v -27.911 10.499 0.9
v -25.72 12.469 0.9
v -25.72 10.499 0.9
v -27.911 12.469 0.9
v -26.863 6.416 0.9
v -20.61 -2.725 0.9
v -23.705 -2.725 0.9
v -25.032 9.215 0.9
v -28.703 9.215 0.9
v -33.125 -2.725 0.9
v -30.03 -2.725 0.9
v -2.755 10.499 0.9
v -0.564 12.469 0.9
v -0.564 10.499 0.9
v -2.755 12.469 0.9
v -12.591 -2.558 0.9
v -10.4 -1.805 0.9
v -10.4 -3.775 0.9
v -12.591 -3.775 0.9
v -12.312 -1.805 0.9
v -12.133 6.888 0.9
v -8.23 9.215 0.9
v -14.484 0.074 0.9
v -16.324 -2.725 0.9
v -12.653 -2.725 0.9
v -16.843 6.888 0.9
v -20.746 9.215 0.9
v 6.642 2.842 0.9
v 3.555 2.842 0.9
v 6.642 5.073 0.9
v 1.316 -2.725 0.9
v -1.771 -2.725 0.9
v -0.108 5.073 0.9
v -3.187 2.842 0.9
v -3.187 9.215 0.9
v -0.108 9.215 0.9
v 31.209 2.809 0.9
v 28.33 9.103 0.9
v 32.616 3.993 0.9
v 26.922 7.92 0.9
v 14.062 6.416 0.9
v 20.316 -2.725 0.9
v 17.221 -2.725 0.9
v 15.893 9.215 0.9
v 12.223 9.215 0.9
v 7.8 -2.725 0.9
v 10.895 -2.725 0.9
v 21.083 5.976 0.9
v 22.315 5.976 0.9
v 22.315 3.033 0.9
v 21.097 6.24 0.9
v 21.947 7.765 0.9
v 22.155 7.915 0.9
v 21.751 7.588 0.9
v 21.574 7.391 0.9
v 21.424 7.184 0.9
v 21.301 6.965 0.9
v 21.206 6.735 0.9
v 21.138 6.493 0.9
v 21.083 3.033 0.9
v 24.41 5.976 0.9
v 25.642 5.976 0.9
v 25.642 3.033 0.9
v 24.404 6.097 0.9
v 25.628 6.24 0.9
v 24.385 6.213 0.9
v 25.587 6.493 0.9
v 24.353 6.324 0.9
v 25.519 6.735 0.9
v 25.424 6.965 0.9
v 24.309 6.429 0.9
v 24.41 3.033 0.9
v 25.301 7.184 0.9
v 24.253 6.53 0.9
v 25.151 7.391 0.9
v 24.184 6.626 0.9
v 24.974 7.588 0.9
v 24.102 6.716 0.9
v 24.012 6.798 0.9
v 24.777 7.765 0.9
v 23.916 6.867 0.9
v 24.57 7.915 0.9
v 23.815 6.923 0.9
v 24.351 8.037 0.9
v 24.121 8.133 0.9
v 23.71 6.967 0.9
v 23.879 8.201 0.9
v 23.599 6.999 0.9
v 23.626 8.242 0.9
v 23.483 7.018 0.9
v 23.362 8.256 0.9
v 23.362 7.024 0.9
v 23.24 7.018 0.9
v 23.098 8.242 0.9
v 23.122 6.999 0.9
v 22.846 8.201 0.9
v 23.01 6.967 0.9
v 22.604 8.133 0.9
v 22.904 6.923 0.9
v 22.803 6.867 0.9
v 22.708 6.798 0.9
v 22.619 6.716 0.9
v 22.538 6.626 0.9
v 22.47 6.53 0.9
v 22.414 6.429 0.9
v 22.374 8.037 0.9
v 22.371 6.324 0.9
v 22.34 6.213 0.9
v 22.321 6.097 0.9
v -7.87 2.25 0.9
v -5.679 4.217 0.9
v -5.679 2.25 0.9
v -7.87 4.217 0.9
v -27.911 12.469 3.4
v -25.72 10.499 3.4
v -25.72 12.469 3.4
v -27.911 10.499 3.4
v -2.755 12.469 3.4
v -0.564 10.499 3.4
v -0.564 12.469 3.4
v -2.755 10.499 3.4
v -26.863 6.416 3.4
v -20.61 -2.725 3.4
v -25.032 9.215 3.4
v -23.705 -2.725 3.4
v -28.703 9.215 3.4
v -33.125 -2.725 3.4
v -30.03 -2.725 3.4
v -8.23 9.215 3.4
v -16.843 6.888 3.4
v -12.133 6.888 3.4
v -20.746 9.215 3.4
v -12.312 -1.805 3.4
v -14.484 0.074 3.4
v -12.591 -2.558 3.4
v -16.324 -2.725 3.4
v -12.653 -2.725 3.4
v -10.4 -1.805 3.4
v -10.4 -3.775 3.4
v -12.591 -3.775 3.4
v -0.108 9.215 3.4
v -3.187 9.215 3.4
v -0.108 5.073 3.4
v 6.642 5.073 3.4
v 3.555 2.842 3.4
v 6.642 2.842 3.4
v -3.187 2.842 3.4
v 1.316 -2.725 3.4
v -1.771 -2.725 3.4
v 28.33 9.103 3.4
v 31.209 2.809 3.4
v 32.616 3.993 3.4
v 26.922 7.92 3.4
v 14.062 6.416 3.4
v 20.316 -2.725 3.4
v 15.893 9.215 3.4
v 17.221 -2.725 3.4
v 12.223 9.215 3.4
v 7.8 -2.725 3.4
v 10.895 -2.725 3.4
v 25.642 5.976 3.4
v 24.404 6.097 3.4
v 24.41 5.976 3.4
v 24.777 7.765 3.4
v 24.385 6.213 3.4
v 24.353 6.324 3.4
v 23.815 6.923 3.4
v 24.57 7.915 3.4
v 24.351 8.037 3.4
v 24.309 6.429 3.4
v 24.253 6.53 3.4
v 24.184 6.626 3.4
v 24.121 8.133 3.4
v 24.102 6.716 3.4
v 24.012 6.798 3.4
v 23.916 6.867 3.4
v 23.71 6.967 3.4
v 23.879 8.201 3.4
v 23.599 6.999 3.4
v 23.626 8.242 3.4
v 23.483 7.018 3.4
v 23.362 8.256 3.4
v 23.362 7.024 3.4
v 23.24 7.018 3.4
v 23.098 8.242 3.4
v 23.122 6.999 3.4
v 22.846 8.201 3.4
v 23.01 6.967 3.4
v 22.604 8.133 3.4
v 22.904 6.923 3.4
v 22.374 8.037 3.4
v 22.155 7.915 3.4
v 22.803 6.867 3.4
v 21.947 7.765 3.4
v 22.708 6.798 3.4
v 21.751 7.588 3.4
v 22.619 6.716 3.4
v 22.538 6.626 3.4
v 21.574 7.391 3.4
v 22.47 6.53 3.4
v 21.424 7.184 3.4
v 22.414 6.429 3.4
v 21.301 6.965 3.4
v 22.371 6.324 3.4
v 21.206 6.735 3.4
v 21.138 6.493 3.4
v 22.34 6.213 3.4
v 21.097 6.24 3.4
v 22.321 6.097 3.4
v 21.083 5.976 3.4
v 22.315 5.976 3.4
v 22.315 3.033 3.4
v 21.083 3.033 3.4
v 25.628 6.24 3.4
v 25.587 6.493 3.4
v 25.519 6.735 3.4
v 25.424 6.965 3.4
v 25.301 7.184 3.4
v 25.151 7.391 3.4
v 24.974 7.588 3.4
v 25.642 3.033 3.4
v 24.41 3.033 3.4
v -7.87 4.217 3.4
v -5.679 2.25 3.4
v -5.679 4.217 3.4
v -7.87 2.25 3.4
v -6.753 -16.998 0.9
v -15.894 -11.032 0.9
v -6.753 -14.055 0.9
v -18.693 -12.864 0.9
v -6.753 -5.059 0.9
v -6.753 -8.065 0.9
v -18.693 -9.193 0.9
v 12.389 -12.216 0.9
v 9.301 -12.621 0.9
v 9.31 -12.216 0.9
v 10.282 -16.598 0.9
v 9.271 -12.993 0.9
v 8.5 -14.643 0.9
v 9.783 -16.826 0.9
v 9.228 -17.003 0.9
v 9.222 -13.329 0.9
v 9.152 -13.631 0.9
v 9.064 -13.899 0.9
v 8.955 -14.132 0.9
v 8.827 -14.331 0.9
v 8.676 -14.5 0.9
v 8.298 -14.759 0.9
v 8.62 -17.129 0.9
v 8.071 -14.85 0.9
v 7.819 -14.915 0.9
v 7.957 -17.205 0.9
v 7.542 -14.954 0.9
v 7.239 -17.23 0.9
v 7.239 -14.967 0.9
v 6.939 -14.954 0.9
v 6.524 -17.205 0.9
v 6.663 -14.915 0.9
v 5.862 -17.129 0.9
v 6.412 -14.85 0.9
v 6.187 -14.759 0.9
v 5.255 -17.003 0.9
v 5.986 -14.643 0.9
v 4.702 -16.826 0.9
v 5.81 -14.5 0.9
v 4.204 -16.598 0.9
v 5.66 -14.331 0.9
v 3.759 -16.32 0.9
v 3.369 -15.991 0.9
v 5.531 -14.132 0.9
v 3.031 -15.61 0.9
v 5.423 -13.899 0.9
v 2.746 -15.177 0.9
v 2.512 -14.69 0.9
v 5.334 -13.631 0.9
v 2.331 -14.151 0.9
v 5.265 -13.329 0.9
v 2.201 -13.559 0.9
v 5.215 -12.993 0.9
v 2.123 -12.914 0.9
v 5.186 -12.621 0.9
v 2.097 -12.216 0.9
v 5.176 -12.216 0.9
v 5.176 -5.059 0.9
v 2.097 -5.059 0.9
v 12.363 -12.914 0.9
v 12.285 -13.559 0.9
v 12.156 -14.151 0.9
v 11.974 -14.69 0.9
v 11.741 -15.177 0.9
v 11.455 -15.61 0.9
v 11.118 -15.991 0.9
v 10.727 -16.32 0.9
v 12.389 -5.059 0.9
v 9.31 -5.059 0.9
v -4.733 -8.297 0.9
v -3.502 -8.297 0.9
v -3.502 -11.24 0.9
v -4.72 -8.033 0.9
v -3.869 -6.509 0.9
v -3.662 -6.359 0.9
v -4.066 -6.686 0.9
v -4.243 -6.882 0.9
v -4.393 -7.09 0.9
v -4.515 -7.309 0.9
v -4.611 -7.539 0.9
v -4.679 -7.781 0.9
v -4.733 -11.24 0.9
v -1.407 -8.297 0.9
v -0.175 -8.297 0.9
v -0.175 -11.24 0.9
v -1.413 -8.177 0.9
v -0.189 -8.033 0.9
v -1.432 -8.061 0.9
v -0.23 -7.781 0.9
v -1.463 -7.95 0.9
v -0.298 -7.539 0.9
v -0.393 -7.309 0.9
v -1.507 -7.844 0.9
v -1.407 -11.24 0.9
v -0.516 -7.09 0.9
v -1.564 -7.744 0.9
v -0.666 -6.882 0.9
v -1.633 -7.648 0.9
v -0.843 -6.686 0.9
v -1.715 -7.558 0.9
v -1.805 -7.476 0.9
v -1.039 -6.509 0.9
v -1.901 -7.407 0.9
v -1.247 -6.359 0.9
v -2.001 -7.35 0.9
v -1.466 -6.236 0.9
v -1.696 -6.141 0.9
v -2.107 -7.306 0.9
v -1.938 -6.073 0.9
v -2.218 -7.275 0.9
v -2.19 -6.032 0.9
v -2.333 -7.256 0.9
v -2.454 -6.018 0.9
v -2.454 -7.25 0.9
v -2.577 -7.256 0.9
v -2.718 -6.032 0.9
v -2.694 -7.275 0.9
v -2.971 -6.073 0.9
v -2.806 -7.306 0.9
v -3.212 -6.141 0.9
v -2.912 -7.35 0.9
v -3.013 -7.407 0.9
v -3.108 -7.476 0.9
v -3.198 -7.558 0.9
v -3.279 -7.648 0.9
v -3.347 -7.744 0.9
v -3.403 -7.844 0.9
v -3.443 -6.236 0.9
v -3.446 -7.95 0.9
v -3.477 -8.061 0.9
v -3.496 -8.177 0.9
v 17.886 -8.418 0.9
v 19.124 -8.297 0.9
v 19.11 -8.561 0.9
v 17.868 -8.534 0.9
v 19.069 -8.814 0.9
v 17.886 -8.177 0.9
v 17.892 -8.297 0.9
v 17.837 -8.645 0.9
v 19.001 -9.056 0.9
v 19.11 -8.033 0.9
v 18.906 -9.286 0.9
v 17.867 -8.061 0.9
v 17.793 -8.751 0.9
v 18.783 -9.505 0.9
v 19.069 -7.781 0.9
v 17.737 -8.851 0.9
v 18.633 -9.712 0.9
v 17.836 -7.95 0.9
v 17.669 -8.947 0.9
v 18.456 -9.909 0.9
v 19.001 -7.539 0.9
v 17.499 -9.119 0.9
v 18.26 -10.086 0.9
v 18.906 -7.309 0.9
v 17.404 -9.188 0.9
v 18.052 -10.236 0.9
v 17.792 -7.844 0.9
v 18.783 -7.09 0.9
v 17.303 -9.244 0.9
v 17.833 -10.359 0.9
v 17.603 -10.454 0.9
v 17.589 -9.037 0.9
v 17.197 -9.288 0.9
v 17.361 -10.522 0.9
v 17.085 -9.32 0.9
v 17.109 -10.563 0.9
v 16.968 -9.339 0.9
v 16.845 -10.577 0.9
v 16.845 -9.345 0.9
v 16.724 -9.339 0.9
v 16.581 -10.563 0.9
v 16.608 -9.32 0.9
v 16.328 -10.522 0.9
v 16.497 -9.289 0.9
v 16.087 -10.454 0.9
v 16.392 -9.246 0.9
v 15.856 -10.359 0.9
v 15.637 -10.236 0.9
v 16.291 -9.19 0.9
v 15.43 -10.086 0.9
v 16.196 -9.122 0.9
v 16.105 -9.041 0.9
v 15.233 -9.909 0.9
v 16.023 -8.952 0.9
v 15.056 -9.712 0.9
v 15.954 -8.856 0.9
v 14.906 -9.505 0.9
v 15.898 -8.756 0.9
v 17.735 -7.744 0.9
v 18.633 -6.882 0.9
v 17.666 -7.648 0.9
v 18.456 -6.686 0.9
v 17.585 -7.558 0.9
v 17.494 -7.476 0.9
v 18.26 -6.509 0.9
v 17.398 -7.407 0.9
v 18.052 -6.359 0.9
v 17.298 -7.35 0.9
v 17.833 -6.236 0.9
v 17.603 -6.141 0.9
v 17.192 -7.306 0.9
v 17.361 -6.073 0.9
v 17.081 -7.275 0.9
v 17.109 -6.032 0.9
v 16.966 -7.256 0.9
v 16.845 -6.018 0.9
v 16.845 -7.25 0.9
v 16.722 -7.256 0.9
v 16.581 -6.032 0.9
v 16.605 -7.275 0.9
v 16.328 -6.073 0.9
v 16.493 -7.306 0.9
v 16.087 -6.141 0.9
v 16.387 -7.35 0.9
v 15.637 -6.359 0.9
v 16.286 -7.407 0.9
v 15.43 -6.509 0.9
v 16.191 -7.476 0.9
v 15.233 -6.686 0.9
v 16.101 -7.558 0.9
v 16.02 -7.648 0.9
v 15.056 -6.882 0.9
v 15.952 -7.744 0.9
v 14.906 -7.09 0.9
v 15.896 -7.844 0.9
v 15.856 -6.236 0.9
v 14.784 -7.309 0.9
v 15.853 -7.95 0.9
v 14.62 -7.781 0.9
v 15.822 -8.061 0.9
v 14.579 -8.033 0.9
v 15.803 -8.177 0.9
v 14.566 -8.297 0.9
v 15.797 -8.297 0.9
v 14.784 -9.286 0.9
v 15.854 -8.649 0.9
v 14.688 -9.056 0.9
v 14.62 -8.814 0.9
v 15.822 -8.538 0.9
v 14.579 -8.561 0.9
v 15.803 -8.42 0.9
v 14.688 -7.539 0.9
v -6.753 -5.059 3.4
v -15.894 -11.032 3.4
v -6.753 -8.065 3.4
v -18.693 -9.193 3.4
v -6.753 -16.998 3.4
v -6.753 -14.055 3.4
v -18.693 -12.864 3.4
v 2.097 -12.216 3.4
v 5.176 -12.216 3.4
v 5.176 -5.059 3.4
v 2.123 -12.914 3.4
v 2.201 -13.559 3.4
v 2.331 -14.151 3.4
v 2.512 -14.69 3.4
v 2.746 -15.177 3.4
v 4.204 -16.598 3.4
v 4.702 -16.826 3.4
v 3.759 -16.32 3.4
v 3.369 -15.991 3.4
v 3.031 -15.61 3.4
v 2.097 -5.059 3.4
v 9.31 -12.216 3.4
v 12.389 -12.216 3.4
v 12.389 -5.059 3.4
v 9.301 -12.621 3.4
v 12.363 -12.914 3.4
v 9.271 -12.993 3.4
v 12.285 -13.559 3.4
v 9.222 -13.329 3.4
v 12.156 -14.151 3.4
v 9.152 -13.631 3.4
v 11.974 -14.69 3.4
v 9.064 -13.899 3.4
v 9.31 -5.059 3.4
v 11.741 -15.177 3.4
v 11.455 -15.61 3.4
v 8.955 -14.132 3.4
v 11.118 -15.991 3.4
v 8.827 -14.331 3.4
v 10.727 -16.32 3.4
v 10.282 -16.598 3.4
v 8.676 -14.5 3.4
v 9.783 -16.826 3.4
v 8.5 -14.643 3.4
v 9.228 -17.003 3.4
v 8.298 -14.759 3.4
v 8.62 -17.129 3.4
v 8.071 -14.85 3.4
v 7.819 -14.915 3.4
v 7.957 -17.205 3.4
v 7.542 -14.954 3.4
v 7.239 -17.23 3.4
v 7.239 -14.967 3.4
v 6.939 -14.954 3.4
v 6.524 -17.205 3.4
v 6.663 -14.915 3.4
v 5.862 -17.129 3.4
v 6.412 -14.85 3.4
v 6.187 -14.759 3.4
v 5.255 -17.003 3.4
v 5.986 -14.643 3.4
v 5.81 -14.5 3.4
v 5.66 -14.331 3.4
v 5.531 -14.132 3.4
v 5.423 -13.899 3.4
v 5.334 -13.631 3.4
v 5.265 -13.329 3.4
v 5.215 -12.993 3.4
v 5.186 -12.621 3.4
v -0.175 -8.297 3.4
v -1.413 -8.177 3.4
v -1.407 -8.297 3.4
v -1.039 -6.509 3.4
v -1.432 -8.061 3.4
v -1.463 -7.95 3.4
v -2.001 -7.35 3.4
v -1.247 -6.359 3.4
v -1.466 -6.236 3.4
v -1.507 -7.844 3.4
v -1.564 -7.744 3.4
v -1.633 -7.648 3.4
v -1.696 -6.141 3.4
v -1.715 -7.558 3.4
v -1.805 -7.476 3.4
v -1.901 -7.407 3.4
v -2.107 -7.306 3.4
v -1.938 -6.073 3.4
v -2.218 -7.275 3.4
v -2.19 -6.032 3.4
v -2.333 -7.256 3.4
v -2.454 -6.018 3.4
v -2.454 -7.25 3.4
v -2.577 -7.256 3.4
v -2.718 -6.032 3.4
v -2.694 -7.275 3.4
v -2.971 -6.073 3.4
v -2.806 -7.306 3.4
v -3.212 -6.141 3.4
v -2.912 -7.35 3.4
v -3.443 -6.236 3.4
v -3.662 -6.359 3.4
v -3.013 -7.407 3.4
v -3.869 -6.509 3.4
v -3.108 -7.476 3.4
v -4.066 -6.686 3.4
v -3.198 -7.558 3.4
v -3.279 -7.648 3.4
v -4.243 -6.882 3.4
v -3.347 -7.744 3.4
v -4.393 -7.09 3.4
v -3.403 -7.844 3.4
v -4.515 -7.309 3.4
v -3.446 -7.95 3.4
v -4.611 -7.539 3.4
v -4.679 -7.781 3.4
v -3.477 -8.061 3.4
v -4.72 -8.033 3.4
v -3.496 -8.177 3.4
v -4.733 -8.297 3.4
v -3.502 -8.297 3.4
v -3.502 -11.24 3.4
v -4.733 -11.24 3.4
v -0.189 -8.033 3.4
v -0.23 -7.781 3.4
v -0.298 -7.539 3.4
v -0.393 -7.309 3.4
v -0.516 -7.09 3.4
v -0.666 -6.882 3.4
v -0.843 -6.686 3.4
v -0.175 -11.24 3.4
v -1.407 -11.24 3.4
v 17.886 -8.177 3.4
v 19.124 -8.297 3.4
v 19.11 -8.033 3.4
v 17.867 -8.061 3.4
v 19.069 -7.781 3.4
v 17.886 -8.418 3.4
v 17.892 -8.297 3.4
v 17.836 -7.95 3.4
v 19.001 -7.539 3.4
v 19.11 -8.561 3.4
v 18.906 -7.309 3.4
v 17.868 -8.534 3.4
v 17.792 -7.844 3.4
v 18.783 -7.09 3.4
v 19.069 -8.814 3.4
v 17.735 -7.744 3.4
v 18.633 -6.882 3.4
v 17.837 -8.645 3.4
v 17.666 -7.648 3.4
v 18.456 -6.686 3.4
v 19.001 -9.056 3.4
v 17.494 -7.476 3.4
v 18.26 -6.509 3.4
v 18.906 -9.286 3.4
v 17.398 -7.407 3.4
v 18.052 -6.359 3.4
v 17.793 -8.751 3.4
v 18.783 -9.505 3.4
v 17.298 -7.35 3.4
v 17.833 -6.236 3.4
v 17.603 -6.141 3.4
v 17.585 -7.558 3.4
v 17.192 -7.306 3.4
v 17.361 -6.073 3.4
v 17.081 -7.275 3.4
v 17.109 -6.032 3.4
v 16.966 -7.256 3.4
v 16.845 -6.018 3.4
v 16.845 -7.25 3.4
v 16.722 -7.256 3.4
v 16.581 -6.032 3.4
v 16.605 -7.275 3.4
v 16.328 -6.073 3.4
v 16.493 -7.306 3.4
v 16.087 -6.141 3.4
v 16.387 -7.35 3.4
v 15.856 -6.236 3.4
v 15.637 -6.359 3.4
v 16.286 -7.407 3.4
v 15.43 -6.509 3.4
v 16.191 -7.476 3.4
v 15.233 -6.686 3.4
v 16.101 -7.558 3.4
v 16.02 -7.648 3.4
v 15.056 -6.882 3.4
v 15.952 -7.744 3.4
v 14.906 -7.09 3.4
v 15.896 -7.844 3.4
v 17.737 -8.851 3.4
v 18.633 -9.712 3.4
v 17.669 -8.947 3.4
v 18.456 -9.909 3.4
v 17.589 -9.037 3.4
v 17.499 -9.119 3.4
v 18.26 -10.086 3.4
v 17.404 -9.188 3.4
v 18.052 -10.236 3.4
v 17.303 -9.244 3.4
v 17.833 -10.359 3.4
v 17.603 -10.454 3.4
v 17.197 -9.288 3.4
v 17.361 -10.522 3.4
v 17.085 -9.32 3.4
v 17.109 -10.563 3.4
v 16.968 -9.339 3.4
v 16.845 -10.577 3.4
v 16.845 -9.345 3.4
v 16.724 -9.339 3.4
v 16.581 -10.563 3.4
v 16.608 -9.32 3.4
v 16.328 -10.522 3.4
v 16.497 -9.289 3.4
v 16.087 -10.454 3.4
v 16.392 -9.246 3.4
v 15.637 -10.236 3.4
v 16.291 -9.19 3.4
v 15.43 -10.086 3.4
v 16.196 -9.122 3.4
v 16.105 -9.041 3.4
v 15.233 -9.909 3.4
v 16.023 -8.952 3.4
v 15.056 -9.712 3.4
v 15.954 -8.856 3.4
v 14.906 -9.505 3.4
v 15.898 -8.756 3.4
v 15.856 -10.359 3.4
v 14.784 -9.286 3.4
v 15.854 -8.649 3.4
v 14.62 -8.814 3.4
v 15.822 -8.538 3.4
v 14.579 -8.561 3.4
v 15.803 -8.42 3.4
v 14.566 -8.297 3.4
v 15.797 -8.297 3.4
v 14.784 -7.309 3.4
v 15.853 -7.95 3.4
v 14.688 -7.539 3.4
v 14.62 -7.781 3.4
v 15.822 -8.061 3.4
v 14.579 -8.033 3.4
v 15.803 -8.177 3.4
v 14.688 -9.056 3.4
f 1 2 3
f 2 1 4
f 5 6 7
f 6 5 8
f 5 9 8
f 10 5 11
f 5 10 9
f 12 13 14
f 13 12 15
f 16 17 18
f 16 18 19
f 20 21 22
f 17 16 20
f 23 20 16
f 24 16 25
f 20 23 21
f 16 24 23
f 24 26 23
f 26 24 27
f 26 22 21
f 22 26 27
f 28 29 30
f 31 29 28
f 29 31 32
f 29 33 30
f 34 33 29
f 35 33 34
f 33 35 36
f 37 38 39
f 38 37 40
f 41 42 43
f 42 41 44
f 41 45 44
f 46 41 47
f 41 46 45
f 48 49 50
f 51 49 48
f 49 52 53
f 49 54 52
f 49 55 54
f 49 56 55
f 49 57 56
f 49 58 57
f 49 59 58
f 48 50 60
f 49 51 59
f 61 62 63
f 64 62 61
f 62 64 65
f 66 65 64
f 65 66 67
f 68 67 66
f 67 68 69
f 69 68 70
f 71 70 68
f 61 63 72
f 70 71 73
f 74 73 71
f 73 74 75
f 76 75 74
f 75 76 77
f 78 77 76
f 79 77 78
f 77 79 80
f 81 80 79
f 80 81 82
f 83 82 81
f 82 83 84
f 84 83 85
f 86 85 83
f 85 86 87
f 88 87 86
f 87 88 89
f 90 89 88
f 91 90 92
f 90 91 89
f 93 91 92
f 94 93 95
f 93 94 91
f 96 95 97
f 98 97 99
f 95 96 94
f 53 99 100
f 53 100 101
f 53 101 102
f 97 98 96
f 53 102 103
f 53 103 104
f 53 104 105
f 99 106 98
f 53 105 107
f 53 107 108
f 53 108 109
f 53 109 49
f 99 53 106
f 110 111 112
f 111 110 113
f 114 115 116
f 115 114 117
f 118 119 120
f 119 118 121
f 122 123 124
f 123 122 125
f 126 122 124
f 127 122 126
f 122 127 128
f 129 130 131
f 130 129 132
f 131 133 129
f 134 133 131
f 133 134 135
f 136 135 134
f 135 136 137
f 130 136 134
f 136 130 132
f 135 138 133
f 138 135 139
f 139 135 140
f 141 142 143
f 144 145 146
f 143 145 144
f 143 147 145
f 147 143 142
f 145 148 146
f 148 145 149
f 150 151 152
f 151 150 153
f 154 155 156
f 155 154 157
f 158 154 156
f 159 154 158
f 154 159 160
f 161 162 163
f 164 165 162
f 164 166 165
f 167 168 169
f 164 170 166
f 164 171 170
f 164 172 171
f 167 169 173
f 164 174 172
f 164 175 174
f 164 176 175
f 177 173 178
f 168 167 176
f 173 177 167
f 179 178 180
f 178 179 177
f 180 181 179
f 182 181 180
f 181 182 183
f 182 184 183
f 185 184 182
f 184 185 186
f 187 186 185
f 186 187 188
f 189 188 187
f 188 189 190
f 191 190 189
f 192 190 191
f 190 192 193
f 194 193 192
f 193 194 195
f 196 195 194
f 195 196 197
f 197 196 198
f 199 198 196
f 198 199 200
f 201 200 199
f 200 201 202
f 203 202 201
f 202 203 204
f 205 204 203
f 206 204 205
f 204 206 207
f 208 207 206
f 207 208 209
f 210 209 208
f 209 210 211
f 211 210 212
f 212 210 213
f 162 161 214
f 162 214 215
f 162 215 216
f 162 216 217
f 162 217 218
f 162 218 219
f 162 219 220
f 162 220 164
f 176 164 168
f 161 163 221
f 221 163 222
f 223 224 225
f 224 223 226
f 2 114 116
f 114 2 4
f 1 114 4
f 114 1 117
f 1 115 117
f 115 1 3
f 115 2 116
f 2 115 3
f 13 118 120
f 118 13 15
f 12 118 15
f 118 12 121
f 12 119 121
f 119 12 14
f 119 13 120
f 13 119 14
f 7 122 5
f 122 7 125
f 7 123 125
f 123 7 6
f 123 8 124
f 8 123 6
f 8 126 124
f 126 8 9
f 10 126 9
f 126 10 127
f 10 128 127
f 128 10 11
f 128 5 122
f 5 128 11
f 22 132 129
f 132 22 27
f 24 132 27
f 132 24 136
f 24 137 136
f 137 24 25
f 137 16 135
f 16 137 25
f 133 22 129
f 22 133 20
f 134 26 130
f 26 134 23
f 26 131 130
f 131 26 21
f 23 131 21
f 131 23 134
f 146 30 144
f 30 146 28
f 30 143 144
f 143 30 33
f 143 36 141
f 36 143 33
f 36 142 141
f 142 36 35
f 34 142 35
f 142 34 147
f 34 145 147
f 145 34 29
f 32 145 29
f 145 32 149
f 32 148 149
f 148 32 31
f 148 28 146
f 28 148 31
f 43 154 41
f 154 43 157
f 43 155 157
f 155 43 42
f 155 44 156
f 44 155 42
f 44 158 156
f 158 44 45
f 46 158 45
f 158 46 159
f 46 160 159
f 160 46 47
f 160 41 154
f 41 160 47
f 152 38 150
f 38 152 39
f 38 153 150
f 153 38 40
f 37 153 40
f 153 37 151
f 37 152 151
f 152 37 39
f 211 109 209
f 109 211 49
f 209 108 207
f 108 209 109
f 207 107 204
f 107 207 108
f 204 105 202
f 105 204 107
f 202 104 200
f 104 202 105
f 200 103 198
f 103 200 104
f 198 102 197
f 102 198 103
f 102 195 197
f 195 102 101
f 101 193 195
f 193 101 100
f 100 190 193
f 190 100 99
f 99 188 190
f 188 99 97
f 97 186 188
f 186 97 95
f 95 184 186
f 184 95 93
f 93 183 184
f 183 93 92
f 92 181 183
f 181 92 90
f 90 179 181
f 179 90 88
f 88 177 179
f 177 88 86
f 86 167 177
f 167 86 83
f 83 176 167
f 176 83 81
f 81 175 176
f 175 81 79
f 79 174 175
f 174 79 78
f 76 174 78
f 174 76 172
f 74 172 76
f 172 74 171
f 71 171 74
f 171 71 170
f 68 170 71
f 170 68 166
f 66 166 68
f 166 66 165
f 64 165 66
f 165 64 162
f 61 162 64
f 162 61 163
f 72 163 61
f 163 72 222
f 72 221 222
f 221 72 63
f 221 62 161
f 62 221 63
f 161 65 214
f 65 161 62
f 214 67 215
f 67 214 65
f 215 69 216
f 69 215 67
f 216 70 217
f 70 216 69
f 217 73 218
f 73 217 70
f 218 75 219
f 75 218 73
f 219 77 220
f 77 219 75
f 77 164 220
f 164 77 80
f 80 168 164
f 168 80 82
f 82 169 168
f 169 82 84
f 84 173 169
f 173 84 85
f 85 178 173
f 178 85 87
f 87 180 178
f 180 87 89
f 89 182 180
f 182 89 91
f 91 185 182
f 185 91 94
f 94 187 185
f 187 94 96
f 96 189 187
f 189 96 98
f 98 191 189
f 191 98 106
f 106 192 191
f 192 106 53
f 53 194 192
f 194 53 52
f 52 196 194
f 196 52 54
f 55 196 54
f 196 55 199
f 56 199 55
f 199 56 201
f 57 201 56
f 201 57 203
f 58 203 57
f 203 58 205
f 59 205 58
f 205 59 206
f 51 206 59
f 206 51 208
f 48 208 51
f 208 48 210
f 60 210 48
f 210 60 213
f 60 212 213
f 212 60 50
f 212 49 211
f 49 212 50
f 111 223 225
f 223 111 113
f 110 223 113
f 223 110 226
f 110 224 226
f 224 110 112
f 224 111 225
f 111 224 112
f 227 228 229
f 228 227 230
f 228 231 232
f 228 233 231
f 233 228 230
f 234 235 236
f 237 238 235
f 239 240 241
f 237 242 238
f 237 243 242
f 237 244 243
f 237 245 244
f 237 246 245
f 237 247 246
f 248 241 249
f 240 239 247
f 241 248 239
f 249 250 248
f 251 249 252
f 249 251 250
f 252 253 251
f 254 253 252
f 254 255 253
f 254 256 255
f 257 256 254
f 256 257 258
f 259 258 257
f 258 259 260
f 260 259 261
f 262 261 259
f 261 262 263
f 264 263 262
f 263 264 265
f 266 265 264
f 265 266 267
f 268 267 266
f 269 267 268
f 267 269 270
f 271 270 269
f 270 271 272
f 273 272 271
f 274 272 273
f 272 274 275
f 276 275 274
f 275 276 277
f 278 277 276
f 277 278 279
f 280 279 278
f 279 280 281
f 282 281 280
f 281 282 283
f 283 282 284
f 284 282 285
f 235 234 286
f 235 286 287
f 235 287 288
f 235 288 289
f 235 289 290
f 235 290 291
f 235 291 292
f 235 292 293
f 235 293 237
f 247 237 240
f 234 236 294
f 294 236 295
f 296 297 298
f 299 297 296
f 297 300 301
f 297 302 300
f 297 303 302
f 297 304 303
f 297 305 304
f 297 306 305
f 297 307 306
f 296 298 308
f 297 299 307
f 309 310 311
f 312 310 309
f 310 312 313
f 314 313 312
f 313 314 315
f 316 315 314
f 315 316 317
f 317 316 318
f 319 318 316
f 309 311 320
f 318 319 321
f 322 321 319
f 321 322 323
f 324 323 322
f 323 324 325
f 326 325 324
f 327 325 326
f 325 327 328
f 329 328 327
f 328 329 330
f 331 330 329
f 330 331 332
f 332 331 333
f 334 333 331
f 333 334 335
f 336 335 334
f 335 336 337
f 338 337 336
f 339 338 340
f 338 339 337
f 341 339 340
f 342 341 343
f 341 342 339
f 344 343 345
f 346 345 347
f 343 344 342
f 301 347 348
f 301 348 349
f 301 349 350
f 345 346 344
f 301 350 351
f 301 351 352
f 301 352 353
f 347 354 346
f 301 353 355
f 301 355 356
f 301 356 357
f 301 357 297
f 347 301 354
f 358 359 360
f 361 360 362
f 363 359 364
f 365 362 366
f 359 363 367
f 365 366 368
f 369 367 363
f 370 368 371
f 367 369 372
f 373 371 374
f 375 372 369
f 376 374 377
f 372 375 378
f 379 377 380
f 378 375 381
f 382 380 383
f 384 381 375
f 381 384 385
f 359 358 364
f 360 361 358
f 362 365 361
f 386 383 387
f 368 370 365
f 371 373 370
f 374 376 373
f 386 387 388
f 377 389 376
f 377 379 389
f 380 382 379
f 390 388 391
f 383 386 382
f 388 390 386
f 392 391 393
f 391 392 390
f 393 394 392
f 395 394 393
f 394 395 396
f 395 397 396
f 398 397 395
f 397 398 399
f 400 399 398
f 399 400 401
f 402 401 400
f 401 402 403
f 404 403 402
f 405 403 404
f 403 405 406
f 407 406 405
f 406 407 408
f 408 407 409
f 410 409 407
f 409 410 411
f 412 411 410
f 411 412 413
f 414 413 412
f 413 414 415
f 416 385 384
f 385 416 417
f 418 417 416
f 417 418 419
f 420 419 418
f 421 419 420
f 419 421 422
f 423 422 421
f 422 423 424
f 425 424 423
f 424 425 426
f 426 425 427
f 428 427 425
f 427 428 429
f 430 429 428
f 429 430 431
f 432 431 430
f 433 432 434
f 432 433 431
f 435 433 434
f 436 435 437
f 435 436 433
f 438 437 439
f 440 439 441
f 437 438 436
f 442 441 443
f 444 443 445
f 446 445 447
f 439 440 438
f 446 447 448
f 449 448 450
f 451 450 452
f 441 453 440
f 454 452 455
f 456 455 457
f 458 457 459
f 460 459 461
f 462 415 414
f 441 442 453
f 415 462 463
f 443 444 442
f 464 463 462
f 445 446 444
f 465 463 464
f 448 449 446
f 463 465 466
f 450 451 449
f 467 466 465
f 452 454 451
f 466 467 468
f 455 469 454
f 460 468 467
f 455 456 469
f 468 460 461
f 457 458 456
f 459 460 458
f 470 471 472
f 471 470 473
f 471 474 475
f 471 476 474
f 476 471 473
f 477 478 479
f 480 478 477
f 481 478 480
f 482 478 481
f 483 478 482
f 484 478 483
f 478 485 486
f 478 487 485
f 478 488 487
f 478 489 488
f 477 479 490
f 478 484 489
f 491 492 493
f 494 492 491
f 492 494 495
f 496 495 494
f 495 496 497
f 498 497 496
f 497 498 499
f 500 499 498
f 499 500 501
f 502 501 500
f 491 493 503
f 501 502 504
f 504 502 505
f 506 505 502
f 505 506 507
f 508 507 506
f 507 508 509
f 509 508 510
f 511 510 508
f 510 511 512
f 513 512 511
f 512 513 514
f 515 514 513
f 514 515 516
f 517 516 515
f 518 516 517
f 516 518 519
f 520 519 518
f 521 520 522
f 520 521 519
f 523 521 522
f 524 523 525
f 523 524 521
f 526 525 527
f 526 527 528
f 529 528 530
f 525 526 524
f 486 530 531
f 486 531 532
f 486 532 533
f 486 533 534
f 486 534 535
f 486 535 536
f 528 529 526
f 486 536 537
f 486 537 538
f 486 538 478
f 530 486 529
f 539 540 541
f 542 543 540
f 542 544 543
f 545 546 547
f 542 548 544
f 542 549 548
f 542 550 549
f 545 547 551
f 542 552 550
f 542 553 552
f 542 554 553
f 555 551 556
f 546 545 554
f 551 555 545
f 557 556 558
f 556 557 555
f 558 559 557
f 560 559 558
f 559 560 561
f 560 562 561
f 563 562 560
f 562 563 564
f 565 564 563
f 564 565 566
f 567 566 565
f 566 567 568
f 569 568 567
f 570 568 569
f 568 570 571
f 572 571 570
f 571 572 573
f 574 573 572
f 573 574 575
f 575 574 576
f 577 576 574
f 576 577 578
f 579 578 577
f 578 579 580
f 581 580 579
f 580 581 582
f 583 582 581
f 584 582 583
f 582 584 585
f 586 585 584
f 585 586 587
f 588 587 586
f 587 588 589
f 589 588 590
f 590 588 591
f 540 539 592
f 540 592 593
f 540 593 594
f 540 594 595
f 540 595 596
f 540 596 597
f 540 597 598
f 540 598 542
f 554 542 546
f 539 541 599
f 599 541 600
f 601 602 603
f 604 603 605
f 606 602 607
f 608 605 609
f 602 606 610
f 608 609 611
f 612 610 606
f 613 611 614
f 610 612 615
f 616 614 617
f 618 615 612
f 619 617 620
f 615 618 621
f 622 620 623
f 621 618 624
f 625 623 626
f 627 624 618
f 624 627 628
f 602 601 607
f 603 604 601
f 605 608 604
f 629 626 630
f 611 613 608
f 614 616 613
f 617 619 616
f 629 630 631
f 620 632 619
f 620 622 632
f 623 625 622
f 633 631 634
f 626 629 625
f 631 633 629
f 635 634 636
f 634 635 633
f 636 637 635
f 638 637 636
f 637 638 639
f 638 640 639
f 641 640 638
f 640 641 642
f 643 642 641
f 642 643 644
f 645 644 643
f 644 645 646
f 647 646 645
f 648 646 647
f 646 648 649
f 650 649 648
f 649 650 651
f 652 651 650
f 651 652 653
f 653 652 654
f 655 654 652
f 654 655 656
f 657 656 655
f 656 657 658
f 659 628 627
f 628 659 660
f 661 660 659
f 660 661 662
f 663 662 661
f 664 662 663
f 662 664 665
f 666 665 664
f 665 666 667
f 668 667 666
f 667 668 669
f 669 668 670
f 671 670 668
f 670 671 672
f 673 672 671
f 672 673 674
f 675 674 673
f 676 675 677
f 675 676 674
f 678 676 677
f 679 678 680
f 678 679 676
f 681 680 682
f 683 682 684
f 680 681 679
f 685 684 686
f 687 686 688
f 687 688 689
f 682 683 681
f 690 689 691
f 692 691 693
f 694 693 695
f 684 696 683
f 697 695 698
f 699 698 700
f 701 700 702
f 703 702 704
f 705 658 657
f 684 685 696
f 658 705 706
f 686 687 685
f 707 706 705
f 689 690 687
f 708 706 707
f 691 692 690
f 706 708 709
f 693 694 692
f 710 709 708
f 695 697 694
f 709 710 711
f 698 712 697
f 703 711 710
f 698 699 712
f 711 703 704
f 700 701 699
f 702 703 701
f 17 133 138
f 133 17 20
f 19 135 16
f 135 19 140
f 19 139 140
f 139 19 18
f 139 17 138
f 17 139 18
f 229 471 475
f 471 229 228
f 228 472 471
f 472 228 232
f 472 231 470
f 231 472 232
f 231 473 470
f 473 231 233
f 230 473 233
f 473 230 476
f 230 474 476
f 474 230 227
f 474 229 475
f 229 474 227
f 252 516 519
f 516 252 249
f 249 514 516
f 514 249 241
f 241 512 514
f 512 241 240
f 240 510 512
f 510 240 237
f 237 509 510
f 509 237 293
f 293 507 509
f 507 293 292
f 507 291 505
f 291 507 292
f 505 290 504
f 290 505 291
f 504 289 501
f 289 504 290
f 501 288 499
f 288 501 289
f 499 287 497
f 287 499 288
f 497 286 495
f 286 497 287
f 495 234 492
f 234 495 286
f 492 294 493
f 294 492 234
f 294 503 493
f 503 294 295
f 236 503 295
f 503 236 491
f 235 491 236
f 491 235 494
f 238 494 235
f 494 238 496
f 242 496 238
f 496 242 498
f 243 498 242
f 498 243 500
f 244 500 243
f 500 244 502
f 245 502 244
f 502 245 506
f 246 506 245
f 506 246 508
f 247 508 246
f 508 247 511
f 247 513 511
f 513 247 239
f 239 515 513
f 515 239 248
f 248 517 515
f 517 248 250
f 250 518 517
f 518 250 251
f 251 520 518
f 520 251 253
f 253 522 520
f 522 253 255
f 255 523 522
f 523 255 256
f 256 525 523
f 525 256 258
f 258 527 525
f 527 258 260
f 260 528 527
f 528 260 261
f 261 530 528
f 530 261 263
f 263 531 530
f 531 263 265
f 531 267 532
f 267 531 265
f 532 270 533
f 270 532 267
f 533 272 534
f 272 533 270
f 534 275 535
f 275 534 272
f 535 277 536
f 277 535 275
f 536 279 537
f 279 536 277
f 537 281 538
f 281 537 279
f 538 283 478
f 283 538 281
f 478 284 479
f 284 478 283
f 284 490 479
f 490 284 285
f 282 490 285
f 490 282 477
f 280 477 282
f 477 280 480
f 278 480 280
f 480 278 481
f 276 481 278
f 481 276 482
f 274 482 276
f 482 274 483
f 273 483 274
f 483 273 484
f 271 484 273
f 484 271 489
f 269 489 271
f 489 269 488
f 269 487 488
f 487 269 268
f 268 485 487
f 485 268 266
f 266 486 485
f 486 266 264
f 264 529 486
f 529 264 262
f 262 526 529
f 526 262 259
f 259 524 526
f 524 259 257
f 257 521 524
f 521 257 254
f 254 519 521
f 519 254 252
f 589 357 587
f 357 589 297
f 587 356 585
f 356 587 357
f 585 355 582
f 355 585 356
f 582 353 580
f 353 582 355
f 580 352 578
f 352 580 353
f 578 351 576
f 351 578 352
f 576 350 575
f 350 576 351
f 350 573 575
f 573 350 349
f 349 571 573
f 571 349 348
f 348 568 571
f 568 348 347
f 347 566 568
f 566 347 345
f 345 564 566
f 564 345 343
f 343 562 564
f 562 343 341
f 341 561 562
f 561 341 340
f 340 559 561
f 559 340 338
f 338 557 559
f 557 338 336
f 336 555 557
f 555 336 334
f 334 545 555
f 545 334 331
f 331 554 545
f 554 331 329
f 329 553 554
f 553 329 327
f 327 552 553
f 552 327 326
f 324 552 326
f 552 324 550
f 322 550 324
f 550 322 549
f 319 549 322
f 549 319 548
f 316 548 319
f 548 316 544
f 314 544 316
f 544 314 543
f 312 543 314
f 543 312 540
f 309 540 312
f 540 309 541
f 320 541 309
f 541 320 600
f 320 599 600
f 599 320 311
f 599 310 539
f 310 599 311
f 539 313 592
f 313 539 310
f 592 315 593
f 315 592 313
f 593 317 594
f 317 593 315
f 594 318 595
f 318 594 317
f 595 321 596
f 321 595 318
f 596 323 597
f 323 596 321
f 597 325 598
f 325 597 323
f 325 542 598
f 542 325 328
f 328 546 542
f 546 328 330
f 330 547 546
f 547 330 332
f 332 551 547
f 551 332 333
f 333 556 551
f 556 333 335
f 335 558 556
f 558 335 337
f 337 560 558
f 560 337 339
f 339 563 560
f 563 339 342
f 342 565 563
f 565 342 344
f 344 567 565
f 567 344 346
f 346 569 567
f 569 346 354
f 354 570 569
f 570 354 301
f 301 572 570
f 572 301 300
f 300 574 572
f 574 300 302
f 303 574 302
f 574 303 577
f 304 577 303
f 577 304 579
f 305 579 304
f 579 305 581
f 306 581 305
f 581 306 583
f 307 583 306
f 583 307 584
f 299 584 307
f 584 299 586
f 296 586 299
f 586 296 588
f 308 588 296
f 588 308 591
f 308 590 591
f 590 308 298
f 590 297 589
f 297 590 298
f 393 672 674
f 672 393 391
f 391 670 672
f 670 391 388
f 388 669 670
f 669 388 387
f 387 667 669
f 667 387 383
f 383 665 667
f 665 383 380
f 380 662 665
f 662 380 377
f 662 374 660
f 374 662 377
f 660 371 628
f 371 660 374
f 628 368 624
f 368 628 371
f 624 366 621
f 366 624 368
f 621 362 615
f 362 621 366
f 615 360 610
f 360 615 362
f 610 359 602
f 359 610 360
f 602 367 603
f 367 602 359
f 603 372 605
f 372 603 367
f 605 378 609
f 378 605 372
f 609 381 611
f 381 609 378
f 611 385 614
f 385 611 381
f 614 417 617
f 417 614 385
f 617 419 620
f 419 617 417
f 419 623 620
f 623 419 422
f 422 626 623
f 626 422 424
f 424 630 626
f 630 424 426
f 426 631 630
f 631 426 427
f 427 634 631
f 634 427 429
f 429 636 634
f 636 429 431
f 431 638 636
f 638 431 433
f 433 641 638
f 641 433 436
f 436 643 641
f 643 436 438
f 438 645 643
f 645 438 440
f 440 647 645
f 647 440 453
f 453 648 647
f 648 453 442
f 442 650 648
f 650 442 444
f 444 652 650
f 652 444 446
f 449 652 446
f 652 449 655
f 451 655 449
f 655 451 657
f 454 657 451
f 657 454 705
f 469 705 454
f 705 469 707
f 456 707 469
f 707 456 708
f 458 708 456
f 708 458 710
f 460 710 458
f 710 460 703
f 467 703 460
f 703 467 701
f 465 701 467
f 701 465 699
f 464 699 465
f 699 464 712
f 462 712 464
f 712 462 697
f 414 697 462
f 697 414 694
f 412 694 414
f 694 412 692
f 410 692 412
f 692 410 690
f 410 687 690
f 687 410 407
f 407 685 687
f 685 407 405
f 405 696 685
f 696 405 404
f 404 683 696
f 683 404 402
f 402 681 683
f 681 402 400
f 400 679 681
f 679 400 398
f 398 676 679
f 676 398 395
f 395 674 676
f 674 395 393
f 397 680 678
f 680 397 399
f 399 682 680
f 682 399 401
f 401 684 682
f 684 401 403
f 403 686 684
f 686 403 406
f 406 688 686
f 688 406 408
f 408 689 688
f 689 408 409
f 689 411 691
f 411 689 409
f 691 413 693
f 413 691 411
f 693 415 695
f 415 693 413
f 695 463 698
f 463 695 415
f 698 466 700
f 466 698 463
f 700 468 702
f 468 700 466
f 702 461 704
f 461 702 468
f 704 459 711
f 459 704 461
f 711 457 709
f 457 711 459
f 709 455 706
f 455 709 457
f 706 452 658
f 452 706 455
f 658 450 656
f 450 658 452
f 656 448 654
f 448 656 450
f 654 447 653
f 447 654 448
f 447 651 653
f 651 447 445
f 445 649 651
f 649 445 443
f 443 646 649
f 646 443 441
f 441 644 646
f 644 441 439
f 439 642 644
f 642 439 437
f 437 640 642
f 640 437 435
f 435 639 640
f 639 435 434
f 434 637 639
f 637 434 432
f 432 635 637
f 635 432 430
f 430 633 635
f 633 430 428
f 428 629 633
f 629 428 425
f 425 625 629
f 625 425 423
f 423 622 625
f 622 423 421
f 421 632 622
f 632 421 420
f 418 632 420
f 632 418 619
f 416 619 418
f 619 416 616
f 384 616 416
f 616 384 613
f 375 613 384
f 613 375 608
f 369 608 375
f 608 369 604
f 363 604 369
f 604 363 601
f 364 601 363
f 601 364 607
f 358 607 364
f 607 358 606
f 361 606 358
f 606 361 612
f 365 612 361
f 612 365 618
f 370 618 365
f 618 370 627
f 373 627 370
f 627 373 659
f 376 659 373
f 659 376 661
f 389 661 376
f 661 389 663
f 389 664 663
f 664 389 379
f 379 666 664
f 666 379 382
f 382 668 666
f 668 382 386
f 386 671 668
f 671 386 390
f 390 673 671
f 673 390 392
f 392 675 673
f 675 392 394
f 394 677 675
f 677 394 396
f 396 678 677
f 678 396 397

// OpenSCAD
$fn = 48;
  // syllabics (overlaid on icon, tallest)
  translate([0, 4.694, 0.900]) linear_extrude(height=2.500) text("ᐲᐍᔮᐱᐢᐠ", size=11.793, halign="center", valign="center", font="Euphemia UCAS:style=Bold");
  translate([0, -9.694, 0.900]) linear_extrude(height=2.500) text("ᐹᐢᑌᐤ", size=11.793, halign="center", valign="center", font="Euphemia UCAS:style=Bold");
